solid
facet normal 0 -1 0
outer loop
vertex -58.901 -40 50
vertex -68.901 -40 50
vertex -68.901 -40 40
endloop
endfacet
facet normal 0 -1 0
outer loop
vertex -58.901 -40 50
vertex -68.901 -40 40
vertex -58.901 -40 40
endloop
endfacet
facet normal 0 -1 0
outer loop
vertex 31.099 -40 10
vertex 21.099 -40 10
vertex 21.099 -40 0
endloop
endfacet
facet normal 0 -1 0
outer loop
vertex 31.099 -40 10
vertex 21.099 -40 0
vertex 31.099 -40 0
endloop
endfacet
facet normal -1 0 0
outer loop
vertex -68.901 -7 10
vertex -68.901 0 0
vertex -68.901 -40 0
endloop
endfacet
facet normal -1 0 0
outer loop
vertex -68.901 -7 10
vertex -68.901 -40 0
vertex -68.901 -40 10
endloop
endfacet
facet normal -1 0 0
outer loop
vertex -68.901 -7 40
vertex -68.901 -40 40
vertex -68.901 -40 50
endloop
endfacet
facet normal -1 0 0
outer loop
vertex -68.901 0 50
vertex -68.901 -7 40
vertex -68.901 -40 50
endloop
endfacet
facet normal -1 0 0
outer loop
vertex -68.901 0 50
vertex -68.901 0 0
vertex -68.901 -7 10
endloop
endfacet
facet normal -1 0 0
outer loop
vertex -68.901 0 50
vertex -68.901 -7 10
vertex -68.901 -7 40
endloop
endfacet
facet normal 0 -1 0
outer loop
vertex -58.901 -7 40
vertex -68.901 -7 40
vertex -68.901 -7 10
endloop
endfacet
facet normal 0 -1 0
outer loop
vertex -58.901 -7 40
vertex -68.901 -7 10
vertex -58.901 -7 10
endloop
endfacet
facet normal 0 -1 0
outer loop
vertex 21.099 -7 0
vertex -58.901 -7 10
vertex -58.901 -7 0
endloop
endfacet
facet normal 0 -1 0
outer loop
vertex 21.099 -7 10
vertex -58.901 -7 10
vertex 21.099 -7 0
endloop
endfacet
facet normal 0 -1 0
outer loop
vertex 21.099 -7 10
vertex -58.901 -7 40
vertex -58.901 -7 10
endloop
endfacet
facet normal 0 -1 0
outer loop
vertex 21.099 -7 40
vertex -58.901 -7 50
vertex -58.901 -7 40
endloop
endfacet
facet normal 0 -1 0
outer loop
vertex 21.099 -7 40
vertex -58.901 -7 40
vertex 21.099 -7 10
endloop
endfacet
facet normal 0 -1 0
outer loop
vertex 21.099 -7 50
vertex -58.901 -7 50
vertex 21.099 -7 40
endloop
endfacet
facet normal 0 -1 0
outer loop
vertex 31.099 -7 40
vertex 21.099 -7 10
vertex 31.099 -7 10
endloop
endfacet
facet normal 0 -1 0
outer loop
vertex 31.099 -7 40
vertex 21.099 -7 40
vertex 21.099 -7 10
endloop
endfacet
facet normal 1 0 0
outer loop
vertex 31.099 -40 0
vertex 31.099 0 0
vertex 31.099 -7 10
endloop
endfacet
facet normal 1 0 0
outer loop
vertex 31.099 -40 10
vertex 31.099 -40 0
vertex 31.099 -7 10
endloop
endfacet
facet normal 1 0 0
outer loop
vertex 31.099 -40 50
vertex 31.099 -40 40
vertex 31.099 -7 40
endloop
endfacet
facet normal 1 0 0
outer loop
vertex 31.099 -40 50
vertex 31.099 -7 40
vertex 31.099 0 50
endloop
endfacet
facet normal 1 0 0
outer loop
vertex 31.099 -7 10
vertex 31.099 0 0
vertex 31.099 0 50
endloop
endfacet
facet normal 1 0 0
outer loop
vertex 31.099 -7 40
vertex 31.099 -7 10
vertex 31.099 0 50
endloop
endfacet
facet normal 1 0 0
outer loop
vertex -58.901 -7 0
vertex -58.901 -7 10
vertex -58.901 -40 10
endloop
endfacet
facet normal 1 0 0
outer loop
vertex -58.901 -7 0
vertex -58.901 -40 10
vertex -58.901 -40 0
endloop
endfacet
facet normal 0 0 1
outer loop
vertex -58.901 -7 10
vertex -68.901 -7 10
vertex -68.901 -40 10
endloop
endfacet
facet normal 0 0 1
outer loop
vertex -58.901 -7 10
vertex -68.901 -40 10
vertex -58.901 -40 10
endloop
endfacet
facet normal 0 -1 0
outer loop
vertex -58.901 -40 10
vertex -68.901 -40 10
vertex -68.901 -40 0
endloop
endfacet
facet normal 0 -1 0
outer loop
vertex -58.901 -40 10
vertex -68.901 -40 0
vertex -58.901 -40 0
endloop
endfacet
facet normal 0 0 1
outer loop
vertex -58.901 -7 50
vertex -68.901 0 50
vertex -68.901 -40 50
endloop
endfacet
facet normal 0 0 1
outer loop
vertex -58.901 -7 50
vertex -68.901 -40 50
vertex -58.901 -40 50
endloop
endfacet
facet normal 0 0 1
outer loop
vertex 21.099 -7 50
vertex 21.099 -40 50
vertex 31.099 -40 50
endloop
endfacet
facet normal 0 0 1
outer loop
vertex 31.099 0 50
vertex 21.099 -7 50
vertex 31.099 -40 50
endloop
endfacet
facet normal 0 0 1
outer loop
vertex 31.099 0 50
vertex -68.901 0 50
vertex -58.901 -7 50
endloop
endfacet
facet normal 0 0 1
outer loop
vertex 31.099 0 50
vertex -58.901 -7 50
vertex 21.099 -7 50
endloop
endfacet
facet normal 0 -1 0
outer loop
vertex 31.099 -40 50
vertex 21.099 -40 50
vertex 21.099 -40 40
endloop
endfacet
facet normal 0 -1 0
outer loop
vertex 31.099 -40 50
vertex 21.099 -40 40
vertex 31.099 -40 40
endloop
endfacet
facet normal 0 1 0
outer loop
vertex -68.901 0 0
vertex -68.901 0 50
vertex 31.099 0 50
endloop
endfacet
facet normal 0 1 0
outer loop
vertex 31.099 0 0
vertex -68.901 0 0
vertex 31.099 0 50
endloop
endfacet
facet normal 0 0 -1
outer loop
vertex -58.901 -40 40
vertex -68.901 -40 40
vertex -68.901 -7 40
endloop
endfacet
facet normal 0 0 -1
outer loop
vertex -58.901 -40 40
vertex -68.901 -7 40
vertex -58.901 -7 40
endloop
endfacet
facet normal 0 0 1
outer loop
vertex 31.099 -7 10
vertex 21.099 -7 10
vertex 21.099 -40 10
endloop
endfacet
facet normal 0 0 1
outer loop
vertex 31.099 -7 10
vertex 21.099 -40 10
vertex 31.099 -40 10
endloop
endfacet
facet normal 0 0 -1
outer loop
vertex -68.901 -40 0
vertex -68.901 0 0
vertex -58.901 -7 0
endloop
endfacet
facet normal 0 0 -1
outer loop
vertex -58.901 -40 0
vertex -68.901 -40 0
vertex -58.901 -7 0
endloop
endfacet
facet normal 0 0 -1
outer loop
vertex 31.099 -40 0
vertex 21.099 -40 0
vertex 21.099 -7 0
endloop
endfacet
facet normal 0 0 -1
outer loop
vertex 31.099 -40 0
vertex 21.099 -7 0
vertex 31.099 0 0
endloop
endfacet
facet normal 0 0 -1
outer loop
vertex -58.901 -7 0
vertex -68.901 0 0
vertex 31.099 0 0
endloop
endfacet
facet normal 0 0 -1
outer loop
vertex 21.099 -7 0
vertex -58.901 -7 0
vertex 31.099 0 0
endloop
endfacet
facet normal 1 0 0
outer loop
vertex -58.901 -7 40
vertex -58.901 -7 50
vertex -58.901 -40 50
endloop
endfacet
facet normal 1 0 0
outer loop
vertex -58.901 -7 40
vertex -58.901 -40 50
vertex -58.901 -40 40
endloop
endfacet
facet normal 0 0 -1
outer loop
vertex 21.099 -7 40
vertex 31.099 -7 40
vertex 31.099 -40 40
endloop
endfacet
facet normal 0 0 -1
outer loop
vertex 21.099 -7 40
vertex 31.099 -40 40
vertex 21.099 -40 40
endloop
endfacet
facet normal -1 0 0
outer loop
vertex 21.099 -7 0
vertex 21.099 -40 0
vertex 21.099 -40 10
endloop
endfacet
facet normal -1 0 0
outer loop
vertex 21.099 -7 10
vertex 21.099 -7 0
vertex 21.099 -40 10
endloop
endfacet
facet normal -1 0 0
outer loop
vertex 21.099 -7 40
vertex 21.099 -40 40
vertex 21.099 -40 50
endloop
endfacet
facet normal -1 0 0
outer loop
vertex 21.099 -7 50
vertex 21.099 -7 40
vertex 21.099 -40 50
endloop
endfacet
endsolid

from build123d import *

# Parameters (mm, degrees)
F0_W     = 100
F0_H     = 50
F1_DEPTH = 25
F2_W     = 10
F2_H     = 10
F3_DEPTH = 15
F4_DEPTH = 18


with BuildPart() as f1:
    # F0 (on Front) → F1 (new body)
    with BuildSketch(Plane.XZ):
        with Locations((-18.900802, 25)):
            Rectangle(F0_W, F0_H)
    extrude(amount=F1_DEPTH)

    # F2 (on face) → F3 (join)
    with BuildSketch(Plane.XZ.offset(25)):
        with Locations((-63.900802, 5)):
            Rectangle(F2_W, F2_H)
        with Locations((-63.900802, 45)):
            Rectangle(F2_W, F2_H)
        with Locations((26.099198, 45)):
            Rectangle(F2_W, F2_H)
        with Locations((26.099198, 5)):
            Rectangle(F2_W, F2_H)
    extrude(amount=F3_DEPTH)

    # F1_face (on face) → F4 (cut)
    with BuildSketch(Plane(origin=(-18.900802, -25, 25), x_dir=(1, 0, 0), z_dir=(0, -1, 0))):
        Polygon((40, 15), (40, 25), (-40, 25), (-40, 15), (-50, 15), (-50, -15), (-40, -15), (-40, -25), (40, -25), (40, -15), (50, -15), (50, 15), align=None)
    extrude(amount=-F4_DEPTH, mode=Mode.SUBTRACT)


solid = f1.part
